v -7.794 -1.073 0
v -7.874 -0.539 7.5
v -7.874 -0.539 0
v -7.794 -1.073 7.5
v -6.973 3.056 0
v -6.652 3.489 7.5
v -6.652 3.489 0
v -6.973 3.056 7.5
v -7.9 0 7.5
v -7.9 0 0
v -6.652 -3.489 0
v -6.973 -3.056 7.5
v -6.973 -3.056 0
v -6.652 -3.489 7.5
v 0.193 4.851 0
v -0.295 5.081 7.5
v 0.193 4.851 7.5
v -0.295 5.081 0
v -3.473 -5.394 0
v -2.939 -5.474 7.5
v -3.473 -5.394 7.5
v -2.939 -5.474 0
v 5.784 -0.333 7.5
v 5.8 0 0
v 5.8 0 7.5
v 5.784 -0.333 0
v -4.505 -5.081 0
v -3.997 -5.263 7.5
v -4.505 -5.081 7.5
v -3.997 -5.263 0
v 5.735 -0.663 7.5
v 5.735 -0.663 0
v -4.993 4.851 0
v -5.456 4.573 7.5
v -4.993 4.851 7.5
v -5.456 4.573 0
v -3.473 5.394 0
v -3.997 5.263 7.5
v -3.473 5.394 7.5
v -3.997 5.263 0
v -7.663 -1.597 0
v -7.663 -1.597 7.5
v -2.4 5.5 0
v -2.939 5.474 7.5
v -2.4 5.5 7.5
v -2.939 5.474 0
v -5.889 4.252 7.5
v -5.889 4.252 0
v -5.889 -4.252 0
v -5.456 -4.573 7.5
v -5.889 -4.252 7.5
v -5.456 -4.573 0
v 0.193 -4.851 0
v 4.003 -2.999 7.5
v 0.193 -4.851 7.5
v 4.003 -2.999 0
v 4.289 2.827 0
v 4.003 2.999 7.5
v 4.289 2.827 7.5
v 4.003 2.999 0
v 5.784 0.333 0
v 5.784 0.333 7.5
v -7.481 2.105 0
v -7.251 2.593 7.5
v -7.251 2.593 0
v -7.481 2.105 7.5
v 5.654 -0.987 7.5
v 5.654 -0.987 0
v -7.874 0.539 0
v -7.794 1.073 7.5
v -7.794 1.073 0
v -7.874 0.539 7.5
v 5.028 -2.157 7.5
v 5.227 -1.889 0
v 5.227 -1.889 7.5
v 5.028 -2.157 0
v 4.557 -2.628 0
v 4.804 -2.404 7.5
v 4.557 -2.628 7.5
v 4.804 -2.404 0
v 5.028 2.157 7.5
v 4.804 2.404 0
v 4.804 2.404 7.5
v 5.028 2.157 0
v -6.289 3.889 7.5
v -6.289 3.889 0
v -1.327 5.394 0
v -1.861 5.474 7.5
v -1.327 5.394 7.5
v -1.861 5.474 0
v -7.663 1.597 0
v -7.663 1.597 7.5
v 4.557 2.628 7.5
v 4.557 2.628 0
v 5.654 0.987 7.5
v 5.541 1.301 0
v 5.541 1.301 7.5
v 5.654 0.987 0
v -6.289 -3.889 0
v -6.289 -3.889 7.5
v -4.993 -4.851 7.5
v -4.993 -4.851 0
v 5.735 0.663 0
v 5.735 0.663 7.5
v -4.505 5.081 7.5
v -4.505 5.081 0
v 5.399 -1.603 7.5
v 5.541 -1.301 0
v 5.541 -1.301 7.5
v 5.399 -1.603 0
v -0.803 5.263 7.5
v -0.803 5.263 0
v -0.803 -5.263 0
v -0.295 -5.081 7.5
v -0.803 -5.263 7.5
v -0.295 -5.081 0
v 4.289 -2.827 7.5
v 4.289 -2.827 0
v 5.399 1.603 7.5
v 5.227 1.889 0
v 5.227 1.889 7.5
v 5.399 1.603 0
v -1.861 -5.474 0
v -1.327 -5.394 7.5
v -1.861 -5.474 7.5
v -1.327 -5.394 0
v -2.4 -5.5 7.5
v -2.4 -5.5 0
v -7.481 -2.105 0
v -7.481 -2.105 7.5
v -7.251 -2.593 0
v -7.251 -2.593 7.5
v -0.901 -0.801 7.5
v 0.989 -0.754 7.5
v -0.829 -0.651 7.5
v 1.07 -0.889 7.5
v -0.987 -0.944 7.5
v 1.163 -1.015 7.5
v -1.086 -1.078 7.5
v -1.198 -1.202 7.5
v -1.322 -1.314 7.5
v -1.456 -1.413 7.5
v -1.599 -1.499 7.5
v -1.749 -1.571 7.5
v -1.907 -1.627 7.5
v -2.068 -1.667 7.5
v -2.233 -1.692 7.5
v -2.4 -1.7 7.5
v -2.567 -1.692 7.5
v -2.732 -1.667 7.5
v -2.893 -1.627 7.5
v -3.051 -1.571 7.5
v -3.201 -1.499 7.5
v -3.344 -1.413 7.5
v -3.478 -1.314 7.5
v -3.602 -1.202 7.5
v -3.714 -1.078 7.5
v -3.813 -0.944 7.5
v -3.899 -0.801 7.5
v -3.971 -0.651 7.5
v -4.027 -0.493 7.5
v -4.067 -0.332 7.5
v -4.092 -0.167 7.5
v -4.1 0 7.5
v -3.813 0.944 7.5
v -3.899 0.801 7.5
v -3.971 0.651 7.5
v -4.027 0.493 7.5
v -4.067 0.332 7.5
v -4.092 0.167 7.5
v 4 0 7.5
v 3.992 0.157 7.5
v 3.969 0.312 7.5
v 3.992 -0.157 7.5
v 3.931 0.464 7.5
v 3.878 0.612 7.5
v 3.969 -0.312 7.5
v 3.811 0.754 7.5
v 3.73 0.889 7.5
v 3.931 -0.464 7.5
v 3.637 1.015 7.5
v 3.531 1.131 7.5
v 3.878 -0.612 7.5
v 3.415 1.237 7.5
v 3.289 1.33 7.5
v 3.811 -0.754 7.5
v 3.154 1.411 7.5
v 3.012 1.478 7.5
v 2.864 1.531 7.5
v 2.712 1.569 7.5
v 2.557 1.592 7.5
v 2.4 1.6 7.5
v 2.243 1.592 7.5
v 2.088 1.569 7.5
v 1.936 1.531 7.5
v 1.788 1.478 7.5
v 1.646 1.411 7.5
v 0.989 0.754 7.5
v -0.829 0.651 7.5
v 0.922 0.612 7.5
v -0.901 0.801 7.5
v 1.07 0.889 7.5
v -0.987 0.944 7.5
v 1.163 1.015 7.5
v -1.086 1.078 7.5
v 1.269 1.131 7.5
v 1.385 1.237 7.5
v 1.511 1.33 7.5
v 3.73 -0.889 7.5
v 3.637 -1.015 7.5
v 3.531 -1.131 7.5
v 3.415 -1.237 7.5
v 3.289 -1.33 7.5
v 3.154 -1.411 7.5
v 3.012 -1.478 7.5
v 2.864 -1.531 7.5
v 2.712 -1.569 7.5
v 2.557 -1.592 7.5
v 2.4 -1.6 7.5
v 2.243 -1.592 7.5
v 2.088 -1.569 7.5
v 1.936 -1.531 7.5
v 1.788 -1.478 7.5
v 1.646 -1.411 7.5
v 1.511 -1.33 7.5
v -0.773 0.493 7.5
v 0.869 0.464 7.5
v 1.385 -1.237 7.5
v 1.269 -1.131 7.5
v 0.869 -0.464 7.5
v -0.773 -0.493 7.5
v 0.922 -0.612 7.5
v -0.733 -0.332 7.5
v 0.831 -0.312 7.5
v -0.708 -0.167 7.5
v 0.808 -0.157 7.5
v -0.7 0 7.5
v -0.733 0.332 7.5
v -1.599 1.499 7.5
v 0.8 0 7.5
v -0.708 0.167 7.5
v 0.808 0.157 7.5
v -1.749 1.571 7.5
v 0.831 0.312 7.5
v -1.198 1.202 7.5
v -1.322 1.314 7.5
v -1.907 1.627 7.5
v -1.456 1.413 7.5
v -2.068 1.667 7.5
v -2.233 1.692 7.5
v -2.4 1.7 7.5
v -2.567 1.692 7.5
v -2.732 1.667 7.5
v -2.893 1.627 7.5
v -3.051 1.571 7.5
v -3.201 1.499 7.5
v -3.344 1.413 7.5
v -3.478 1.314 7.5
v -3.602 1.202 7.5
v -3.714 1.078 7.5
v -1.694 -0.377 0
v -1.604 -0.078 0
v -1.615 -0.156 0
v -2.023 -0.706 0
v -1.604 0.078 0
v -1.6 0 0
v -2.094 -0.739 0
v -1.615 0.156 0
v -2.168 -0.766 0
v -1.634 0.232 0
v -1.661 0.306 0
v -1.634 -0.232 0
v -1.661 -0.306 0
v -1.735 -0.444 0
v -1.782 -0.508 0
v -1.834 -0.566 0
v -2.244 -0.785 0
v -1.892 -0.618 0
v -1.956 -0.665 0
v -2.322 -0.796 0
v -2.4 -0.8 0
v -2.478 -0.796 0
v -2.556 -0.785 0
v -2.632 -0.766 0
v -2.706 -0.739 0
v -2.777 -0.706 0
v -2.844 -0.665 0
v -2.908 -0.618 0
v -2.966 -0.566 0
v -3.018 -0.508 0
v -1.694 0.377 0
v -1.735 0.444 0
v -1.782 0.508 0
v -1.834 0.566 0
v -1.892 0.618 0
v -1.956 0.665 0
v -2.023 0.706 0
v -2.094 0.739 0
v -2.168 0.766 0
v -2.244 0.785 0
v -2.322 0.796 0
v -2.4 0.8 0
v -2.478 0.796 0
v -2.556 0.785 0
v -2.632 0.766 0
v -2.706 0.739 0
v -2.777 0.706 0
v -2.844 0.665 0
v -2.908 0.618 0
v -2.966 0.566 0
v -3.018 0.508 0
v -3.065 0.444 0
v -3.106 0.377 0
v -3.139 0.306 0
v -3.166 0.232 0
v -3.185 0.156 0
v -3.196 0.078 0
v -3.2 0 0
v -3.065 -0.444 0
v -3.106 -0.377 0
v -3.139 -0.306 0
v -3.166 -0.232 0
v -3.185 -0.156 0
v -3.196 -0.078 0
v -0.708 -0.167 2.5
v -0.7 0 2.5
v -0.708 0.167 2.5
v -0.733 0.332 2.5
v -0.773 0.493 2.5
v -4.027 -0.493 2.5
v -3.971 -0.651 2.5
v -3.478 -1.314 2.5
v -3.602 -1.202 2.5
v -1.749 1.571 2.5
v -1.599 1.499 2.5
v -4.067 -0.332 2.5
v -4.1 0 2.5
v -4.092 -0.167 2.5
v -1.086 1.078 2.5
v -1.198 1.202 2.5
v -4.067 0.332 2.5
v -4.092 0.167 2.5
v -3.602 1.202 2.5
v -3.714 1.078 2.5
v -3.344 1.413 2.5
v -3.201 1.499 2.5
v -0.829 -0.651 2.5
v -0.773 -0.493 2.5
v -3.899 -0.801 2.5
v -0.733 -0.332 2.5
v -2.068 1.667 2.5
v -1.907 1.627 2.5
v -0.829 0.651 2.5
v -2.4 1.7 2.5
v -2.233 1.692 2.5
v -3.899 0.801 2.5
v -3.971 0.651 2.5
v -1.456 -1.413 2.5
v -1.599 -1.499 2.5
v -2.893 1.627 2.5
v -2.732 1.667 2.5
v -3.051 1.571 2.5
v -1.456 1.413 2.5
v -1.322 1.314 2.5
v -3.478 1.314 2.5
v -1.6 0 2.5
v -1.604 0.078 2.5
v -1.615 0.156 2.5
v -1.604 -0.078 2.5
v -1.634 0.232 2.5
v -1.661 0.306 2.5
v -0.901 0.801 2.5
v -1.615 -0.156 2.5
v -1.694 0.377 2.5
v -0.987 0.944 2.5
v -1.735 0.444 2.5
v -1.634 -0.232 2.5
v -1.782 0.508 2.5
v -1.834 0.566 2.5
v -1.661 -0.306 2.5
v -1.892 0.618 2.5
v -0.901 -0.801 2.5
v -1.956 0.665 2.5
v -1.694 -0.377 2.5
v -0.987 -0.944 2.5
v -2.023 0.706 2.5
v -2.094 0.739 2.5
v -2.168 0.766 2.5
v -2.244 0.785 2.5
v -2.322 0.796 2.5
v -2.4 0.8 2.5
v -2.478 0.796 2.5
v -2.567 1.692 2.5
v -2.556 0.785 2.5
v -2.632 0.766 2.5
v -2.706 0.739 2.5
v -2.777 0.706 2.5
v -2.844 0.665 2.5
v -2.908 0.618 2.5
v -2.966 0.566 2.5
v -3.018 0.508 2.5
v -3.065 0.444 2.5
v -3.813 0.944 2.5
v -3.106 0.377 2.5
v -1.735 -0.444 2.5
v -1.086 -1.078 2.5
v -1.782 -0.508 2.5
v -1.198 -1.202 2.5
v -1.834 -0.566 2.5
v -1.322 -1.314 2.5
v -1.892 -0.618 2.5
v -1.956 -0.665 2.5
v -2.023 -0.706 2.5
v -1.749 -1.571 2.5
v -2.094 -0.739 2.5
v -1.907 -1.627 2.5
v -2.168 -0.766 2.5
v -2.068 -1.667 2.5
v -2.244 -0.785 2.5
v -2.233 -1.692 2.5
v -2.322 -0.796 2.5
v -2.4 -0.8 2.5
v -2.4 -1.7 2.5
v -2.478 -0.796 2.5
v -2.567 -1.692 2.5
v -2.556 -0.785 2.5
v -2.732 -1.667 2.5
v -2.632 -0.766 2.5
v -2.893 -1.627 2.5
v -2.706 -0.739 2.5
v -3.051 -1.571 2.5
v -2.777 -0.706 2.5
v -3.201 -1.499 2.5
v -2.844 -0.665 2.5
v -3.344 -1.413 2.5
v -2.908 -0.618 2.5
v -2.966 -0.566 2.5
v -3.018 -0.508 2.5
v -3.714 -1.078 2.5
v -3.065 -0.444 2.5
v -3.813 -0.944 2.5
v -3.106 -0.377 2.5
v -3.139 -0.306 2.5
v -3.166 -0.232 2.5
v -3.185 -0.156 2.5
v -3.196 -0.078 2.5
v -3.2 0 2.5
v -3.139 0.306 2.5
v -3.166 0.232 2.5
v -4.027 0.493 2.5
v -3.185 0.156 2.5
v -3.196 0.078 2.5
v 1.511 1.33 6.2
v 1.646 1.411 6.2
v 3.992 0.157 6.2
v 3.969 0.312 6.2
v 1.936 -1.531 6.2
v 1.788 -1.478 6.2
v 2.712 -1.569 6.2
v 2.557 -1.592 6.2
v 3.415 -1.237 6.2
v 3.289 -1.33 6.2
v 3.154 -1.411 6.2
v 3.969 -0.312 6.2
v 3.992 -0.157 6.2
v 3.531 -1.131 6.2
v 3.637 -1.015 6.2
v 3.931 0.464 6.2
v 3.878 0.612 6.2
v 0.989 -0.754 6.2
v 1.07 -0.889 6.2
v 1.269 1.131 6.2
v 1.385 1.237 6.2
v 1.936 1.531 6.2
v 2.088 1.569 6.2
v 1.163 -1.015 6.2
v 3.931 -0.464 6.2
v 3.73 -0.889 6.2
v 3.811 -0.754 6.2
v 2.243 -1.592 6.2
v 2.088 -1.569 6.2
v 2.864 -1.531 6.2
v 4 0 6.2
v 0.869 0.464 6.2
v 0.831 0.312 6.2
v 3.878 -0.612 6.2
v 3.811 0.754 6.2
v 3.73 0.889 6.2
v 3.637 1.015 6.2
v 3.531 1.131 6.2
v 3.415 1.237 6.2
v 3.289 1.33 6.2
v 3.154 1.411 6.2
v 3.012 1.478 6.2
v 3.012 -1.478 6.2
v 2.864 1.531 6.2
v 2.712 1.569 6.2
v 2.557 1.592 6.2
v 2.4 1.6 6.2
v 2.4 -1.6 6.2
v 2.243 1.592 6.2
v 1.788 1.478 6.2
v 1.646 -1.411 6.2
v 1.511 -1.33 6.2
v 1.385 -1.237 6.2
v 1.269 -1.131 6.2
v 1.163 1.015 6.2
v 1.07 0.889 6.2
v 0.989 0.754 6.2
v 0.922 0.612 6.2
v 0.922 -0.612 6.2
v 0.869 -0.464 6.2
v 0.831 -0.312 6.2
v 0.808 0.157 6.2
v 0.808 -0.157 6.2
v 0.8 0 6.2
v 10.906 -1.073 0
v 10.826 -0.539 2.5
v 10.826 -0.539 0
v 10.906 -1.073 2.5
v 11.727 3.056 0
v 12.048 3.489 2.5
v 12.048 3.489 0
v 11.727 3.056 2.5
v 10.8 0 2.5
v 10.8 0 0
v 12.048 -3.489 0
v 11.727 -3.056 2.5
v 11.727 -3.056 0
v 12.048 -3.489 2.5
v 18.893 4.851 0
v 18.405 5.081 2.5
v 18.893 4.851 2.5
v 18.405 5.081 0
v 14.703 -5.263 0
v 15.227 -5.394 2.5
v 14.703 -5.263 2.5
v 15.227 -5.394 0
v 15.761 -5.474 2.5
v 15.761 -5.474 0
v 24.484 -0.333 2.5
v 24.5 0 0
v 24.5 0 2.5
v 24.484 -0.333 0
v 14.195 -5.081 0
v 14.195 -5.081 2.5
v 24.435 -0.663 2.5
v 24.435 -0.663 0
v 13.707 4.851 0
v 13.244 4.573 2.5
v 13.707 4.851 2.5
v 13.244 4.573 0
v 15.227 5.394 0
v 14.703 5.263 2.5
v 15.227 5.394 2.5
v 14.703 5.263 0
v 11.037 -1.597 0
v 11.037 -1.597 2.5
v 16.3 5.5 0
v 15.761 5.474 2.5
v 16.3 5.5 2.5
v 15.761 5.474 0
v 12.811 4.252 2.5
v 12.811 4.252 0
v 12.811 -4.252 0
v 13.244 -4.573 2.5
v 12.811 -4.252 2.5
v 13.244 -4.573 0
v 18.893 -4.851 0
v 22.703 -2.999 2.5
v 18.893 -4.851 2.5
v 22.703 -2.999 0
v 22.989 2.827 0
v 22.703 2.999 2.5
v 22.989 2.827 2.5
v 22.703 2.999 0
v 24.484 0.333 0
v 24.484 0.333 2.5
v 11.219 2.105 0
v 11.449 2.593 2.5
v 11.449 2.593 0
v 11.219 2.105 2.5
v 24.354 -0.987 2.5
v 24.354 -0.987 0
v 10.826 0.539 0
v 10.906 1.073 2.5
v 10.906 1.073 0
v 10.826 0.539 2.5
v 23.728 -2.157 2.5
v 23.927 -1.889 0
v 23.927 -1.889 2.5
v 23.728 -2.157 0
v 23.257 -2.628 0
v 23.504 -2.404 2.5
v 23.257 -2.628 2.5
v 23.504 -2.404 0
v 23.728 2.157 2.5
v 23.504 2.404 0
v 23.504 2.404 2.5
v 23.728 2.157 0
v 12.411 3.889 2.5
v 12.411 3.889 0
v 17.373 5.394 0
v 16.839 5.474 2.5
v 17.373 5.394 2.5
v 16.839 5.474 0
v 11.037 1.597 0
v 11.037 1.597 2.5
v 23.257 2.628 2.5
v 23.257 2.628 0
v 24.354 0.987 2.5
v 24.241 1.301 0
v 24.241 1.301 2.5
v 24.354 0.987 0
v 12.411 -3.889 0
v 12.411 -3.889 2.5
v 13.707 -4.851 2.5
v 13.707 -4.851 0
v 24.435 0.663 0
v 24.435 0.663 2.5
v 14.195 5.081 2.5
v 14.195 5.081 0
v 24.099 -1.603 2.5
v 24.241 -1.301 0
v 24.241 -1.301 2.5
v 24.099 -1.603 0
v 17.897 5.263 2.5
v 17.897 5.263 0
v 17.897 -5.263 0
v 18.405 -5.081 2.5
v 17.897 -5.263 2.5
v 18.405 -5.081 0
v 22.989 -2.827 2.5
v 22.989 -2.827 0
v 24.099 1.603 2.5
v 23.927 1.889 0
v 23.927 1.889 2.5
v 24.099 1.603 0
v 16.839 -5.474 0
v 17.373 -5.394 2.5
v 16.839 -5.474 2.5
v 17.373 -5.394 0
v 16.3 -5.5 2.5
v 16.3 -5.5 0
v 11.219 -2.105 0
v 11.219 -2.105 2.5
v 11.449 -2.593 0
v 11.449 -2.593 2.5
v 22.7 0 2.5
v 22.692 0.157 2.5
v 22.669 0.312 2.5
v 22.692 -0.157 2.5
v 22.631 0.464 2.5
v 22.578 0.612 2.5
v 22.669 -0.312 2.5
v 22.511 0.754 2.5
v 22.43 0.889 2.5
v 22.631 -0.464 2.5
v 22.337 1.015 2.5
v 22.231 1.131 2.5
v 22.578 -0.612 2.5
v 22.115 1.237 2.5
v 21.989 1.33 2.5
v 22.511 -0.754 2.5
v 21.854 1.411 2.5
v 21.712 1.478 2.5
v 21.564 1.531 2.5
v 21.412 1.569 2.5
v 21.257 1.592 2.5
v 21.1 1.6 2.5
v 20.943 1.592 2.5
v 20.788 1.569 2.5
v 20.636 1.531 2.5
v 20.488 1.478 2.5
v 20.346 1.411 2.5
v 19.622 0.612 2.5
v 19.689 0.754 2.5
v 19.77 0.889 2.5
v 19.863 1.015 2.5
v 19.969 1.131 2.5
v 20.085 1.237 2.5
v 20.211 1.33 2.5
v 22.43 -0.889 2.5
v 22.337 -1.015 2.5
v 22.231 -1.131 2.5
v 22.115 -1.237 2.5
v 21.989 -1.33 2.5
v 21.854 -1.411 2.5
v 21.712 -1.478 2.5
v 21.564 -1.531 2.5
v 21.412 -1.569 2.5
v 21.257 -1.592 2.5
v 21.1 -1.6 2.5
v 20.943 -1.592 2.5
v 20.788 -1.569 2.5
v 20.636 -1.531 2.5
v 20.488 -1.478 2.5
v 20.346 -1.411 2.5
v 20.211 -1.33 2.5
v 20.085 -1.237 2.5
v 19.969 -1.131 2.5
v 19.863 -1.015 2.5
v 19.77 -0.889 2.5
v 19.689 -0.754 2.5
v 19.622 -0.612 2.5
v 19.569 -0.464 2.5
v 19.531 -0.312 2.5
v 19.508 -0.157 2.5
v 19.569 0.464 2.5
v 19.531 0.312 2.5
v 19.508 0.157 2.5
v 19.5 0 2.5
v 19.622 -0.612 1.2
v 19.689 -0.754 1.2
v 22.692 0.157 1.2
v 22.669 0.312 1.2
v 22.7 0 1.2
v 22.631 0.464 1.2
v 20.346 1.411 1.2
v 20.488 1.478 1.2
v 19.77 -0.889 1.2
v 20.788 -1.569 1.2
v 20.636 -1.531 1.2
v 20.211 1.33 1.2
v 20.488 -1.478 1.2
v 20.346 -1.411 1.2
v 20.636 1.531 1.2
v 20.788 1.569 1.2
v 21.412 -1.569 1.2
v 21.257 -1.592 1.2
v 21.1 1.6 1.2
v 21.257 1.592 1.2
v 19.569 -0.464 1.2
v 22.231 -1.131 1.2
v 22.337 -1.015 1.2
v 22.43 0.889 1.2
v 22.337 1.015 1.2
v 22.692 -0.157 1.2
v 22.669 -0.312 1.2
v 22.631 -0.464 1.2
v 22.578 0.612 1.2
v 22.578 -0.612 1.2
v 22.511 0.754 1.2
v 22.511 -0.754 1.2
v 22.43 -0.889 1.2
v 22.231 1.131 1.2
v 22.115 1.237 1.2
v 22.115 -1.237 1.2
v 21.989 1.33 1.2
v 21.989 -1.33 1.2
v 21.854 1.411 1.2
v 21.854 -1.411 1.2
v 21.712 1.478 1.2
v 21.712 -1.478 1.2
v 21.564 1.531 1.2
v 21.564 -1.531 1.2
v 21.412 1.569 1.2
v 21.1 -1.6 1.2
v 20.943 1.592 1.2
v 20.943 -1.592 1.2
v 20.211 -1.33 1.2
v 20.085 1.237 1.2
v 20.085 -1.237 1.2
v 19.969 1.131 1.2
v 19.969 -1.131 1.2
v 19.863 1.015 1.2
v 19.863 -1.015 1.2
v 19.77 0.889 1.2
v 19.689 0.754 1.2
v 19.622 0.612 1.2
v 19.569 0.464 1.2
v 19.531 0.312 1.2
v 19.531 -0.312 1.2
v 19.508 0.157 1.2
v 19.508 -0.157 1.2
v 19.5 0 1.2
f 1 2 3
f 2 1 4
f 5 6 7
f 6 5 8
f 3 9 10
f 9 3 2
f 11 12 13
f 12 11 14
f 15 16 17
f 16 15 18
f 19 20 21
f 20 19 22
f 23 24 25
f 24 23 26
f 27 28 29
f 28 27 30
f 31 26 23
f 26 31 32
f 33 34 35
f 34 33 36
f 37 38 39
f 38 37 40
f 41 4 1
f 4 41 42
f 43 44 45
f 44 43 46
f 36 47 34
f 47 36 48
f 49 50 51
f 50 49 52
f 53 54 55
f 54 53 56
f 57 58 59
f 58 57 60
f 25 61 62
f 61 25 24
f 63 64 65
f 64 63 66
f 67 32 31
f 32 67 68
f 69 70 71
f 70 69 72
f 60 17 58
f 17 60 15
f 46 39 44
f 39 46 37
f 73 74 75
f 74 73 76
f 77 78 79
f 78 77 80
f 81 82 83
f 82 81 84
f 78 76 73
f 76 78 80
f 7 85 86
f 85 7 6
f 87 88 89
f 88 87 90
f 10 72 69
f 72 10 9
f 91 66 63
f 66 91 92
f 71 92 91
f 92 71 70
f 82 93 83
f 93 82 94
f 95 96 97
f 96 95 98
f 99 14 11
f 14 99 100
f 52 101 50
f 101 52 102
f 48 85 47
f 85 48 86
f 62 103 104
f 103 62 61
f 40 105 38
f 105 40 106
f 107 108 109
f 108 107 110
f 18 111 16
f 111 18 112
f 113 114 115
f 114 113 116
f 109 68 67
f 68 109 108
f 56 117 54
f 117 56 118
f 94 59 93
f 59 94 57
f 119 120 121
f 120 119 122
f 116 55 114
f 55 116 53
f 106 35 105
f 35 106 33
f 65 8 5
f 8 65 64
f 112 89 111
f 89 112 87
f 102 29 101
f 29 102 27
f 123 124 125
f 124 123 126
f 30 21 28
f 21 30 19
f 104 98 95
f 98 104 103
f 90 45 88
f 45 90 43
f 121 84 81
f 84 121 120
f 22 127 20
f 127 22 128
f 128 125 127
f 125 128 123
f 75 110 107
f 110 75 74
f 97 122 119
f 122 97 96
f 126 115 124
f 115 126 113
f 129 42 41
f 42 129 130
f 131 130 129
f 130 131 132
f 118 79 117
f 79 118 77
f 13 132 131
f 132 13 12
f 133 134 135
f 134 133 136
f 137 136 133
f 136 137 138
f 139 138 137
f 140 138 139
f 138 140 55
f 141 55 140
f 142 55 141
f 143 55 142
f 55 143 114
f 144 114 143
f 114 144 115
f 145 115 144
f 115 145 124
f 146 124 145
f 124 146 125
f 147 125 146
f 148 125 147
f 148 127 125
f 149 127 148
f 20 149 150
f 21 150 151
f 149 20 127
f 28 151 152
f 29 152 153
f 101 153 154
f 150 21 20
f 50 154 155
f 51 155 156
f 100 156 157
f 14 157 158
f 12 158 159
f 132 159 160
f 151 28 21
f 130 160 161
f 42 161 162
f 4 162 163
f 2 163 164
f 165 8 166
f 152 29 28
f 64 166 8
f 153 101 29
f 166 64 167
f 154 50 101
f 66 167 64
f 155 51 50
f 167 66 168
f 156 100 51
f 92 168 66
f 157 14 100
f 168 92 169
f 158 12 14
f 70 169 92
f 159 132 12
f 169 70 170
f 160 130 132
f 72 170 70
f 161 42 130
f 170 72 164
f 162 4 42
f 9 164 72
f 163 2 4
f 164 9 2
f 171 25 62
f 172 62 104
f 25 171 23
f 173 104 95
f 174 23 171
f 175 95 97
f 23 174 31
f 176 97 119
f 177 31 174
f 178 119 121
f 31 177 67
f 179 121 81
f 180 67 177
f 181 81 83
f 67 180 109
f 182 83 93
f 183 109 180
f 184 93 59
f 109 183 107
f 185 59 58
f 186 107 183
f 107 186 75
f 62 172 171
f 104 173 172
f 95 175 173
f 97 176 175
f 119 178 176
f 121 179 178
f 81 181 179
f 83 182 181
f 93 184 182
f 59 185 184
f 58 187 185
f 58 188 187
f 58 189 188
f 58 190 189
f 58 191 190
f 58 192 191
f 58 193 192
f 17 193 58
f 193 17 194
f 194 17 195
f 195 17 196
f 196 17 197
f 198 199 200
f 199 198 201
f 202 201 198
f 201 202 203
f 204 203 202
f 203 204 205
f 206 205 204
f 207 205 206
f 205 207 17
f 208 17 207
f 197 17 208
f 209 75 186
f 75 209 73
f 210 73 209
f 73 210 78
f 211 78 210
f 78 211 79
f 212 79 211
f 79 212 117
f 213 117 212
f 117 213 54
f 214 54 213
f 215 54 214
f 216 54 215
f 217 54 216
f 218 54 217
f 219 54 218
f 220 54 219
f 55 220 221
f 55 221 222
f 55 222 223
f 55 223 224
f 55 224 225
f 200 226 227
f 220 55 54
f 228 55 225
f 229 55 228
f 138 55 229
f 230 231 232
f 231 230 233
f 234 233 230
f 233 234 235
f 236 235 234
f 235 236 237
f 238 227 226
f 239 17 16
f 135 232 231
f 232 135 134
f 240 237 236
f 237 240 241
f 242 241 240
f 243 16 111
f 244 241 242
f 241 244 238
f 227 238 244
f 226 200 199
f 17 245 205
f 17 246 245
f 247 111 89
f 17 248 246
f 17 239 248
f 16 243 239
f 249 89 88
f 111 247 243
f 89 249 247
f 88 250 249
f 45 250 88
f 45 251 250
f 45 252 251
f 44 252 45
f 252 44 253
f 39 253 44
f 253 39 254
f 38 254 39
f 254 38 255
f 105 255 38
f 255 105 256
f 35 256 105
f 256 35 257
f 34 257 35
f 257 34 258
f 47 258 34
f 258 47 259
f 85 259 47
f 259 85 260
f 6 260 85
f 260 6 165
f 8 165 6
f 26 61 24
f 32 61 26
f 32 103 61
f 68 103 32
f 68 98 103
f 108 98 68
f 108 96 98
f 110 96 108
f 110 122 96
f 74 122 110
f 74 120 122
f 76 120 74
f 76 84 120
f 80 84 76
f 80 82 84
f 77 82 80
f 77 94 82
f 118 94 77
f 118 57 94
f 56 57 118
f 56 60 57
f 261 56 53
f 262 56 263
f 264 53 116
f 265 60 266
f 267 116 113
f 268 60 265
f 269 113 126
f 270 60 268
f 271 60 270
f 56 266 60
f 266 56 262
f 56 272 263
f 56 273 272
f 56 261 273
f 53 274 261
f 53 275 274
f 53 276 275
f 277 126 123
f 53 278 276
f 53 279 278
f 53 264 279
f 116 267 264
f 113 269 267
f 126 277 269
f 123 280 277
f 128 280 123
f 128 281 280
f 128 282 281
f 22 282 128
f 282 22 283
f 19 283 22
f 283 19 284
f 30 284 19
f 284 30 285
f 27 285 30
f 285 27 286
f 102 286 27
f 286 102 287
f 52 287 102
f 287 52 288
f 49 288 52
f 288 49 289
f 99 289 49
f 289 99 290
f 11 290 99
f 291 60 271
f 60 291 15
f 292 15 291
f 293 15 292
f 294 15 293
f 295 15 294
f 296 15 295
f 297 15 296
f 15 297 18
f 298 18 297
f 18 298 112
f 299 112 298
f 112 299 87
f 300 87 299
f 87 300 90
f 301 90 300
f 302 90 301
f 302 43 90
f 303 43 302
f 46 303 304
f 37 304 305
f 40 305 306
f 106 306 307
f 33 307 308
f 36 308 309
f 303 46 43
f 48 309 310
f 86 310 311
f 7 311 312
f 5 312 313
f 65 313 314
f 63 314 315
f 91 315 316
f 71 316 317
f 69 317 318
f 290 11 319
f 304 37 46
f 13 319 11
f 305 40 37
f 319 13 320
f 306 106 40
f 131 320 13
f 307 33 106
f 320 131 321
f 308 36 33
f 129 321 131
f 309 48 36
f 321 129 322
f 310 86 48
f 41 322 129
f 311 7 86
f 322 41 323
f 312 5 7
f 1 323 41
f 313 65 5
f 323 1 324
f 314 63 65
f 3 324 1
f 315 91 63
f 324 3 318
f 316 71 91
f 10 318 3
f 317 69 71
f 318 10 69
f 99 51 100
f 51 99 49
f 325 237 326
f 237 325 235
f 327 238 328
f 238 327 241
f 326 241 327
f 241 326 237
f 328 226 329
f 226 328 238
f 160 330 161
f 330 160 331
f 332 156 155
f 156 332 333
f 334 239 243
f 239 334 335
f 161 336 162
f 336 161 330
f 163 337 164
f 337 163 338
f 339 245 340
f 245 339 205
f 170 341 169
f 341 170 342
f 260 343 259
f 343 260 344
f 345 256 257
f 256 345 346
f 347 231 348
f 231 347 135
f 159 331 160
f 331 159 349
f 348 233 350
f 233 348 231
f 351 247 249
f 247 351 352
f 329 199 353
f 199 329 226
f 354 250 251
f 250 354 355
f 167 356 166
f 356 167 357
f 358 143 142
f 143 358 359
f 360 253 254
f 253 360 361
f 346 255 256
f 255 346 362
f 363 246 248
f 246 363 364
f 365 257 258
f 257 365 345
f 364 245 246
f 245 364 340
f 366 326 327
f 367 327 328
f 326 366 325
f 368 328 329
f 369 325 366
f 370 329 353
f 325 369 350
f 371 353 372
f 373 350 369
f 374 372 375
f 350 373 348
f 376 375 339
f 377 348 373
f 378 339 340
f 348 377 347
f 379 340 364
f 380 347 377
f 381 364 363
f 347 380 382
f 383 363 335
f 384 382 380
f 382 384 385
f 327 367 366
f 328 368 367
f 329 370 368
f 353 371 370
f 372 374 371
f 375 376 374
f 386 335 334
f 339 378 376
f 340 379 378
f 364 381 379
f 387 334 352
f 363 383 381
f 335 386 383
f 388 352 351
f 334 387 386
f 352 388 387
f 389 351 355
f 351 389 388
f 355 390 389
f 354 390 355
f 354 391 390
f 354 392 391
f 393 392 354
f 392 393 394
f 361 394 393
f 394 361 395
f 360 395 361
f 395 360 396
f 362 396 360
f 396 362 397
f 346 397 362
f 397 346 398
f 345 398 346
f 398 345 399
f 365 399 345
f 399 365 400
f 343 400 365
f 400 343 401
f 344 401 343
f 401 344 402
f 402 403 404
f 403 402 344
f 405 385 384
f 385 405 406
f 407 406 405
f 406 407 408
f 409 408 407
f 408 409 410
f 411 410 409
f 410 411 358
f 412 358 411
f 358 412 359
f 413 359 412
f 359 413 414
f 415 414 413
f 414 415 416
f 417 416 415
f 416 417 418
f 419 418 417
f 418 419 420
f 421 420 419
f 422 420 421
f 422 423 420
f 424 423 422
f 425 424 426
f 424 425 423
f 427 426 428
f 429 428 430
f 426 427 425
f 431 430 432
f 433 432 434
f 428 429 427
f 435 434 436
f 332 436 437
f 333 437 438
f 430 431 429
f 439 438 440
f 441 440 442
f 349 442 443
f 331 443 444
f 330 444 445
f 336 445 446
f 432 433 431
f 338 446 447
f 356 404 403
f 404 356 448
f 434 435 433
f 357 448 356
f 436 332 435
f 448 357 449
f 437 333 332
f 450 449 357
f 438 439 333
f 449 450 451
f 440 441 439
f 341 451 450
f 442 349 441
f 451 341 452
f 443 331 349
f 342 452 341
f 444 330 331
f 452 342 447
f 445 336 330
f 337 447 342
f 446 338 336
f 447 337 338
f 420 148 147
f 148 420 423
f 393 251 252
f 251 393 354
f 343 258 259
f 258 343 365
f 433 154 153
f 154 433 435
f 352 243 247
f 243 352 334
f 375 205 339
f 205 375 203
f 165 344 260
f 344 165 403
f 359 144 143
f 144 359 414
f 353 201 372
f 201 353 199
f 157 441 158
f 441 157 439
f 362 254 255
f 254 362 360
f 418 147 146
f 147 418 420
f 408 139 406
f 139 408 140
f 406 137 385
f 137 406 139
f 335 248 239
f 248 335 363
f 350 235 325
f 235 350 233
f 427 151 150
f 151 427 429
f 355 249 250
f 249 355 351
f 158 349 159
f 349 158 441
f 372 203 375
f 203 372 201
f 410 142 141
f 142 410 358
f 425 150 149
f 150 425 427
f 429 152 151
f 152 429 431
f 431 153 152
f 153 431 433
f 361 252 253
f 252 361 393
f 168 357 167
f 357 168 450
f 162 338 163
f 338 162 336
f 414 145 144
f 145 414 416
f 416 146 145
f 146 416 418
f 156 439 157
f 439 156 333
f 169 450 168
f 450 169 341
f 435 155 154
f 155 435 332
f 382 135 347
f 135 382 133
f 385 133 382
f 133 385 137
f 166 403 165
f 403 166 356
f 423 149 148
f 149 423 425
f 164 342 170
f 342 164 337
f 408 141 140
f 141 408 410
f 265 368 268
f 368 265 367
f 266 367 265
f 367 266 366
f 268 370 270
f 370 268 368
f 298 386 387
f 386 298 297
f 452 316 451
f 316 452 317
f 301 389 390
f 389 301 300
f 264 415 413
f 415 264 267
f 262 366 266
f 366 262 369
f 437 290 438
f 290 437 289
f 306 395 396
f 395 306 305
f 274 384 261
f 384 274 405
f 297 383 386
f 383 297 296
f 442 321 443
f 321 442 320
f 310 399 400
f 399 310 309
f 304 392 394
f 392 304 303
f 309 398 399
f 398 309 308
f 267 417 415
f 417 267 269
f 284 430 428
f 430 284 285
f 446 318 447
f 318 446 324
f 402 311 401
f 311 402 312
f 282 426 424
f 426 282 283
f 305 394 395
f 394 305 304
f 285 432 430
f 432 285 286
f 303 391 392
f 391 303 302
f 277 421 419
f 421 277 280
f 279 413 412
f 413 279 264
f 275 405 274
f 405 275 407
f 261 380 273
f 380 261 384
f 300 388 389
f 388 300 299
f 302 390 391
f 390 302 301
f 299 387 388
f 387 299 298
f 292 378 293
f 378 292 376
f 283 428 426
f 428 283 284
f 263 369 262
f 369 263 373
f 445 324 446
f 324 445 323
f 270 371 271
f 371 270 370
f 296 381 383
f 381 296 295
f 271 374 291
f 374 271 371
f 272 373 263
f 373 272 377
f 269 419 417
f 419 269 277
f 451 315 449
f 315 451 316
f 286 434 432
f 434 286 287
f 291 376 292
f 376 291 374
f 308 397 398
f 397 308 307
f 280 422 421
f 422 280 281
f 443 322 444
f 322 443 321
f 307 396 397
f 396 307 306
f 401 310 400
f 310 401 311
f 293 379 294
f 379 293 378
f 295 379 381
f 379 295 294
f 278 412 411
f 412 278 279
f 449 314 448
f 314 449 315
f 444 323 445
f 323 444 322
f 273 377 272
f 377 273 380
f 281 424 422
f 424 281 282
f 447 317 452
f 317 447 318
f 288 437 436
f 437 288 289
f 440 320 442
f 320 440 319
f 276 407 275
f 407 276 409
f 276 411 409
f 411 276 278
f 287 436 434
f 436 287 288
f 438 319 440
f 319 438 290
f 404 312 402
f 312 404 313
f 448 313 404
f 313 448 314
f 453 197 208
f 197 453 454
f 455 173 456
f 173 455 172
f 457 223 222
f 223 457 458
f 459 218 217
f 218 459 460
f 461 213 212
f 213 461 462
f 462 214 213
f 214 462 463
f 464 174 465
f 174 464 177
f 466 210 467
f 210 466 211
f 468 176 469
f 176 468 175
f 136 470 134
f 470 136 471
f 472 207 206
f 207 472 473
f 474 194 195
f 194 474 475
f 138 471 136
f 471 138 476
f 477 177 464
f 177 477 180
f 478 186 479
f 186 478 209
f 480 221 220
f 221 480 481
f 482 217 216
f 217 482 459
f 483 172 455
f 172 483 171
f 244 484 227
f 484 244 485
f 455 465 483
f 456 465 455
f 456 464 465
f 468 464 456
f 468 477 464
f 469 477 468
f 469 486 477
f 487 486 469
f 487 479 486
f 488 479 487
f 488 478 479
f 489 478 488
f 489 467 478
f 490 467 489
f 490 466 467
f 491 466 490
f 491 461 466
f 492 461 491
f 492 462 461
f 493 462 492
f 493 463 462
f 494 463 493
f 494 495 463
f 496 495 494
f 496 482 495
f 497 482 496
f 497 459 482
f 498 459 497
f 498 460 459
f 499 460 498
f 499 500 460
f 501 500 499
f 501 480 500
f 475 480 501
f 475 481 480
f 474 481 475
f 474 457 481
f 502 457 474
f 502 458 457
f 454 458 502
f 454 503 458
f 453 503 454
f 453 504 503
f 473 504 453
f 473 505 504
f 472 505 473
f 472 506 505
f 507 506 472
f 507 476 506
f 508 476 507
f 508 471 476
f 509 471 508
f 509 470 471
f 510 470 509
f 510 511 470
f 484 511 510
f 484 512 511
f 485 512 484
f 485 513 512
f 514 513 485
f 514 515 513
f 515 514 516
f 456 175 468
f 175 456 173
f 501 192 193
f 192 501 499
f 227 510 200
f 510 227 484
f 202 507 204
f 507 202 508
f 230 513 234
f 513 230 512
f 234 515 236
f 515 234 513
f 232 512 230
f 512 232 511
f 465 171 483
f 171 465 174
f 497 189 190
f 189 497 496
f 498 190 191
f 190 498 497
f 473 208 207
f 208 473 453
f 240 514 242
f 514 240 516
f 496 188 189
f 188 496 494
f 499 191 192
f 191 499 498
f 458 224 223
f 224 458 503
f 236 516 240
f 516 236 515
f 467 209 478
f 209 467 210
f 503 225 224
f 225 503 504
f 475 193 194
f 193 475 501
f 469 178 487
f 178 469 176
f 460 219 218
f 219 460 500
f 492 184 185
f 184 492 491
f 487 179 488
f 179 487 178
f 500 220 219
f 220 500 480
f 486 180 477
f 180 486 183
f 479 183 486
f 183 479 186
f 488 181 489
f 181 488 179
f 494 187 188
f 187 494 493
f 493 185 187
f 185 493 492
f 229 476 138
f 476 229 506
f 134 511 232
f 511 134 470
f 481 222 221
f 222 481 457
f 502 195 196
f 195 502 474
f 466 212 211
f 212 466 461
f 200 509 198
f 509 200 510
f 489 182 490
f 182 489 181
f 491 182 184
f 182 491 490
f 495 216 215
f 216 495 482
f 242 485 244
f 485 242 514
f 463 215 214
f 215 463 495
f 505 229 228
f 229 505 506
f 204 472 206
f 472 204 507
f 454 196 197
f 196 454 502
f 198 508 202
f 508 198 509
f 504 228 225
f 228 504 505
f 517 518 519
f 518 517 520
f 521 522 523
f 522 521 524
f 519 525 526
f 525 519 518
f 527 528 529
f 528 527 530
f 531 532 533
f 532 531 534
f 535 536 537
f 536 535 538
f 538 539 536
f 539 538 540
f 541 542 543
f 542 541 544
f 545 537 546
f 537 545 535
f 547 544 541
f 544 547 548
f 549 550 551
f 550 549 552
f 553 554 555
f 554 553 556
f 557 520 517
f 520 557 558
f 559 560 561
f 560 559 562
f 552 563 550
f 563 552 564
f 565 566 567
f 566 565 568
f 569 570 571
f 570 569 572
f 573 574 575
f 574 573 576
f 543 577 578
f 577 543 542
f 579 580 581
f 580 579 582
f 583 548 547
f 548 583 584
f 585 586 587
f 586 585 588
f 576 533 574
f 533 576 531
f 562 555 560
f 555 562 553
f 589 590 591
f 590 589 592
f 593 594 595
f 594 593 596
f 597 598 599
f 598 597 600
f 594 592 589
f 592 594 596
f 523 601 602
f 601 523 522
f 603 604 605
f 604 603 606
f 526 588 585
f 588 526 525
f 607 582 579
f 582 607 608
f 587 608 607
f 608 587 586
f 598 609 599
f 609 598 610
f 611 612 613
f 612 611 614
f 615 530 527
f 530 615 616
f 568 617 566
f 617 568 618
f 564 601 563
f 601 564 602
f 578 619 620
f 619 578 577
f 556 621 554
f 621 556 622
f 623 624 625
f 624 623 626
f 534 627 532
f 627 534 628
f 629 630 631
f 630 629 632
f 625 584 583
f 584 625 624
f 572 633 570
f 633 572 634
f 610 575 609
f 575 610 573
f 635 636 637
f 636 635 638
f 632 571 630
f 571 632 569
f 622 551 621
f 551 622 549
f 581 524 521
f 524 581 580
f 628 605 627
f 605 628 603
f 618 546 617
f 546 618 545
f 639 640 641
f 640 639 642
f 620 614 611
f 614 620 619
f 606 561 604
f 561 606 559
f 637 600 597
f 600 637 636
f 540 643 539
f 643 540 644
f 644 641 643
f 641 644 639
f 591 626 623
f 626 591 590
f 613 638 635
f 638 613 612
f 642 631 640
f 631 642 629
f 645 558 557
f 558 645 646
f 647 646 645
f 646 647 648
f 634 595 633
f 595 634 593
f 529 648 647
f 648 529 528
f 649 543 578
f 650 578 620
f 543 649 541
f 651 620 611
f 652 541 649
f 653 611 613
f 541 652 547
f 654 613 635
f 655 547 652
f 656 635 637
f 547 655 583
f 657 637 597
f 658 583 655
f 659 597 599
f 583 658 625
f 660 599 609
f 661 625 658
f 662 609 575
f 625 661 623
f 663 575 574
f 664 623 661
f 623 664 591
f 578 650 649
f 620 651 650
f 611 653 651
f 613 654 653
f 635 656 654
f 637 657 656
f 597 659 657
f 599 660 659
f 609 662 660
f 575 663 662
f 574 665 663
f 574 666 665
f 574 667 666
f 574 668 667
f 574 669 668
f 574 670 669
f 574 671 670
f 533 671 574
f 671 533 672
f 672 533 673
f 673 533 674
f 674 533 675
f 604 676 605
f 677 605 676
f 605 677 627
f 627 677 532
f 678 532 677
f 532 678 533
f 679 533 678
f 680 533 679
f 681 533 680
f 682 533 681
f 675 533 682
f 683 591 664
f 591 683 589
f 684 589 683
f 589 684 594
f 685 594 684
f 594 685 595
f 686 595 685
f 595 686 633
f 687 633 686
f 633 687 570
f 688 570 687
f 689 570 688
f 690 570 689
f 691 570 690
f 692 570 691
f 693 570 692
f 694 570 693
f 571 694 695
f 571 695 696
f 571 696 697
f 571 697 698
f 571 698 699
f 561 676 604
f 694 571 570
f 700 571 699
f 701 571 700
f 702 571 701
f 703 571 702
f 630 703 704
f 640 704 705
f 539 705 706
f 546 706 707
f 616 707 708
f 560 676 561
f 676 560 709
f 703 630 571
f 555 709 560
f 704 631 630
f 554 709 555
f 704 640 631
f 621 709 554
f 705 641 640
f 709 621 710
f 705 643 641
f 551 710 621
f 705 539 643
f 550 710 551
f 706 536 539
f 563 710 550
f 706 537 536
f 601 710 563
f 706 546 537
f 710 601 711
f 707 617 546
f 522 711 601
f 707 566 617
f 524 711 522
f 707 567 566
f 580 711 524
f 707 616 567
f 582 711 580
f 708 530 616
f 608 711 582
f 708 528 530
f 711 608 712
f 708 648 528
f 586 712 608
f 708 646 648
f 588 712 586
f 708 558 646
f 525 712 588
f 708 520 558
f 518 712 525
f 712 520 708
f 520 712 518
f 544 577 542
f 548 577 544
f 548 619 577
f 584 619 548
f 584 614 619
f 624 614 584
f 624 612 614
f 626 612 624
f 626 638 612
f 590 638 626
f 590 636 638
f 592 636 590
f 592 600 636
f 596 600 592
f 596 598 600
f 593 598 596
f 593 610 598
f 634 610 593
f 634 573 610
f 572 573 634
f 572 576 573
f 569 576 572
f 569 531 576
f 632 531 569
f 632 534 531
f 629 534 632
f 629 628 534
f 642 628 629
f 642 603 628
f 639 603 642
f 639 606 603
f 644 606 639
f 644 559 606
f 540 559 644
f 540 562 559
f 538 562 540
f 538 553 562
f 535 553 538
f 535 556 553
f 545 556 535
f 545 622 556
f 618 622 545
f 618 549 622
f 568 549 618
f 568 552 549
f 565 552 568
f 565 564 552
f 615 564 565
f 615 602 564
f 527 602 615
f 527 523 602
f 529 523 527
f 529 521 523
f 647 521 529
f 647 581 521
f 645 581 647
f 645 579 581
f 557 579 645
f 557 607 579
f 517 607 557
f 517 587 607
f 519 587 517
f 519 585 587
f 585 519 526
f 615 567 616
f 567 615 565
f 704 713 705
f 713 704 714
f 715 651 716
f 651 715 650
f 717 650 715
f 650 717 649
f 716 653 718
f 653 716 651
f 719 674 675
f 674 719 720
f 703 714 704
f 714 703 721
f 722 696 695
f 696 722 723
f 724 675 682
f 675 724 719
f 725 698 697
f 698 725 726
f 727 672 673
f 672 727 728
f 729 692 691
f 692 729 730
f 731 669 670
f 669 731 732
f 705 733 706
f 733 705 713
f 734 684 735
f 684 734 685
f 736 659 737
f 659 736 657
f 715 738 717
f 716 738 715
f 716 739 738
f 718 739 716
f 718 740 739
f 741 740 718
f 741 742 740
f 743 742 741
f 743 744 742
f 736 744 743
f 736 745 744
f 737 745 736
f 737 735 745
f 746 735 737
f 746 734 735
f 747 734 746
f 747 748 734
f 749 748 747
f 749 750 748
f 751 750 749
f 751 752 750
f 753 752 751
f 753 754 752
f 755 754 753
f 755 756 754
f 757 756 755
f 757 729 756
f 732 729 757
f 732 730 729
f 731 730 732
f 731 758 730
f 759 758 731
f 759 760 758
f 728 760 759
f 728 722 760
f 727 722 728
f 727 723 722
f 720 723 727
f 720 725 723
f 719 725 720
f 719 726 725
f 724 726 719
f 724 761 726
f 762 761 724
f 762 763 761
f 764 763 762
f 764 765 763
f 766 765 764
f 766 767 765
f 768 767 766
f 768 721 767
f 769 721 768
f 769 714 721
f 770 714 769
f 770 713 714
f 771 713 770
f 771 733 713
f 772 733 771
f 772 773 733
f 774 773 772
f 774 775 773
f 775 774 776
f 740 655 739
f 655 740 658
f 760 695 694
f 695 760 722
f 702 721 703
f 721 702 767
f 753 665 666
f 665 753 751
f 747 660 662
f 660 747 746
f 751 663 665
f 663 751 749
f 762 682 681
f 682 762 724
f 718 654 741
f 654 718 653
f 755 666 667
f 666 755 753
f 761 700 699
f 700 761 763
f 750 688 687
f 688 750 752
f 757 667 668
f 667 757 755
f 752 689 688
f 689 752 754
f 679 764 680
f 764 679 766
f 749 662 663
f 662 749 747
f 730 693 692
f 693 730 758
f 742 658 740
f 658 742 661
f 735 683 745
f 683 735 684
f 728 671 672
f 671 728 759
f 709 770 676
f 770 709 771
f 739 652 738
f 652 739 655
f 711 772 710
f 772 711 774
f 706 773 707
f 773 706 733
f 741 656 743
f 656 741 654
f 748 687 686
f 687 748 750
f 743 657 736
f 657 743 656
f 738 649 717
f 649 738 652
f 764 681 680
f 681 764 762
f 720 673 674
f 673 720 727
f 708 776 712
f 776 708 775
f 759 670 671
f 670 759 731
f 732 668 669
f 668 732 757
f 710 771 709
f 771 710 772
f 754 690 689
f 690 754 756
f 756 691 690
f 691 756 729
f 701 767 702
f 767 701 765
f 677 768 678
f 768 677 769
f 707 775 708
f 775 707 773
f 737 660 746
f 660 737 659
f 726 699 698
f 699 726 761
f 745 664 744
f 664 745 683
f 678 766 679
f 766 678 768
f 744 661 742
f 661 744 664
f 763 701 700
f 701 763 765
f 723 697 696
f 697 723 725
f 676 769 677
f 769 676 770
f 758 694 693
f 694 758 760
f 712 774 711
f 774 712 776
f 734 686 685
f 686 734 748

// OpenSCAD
// ============================================================
// Camera-in-use LED sensor pod + magnetic anchor
// For: Logitech Brio 105, TEPT4400 phototransistor, 3x1mm magnets
//
// Two parts on one plate:
//   1) sensor_pod()     - holds the TEPT4400 + acts as the light shroud
//   2) magnet_anchor()  - sticks to the camera next to the LED
//
// MEASURED FROM THE ACTUAL CAMERA (tape measure + photos):
//   - LED is a thin arc, ~10-11mm from the camera's left edge (~1mm wide)
//   - Top of the LED arc is ~12mm from the camera's top edge
//   - Camera housing (front capsule) thickness/depth: 17mm
// These numbers are for placing the anchor by hand - they are NOT baked
// into the model, since the pod attaches via magnet, not a fixed clamp.
// Before printing: cut a ~14mm x 11mm rectangle out of paper/cardboard
// and hold it at that spot on the real camera to confirm it clears the
// lens and the housing's curved edge - cheap sanity check against a
// camera curvature I'm guessing at, not measuring directly.
//
// ROTATION KEYING
// A single round magnet-to-magnet joint has no rotational preference -
// the pod could spin on re-attachment and drift the tunnel off the LED.
// To prevent that, the pod/anchor footprint is deliberately asymmetric
// (a "fat end" toward the sensor bore, "thin end" toward the magnet) so
// the two parts can only mate in the correct orientation.
//
// PRINT NOTES
// - Material: matte black PETG or ABS. Glossy filament reflects stray
//   light down the tunnel and defeats the shroud.
// - Orientation: print both parts sitting on their front/adhesive face,
//   holes opening upward - no supports needed either part.
// - FDM holes print undersized - test-fit the TEPT4400 and the magnet
//   after printing; ream out by hand with a 3mm/3.2mm drill bit if tight.
// - The front rim is flat/rigid and won't perfectly match the camera's
//   slight curve. Stick a thin ring of adhesive foam weatherstrip tape
//   to the front rim before final placement - it conforms to the curve
//   and completes the light seal far better than bare plastic-on-plastic.
// - Mark the magnet's polarity with a marker dot before gluing into each
//   part, so pod and anchor always attract (not repel).
// ============================================================

$fn = 64; // smooth circles

// ---- measure-and-adjust before printing ----
tept_dome_d      = 3.0;   // TEPT4400 dome diameter (datasheet nominal)
tept_bore_d      = tept_dome_d + 0.4;   // add clearance
tept_bore_depth  = 5.0;   // dome + a bit of the leaded body

tunnel_d         = 1.6;   // narrowed from an earlier 2.0mm - the measured
                          // LED arc is only ~1mm wide, so a tighter
                          // tunnel improves contrast (trade-off: needs
                          // more careful alignment when placing the pod)
tunnel_len       = 2.5;   // longer = better ambient-light rejection,
                          // but must stay clear of the lens - keep short

magnet_d         = 3.2;   // 3mm magnet + clearance
magnet_len       = 1.3;   // 1mm magnet + a little glue gap

pod_wall         = 1.8;   // wall thickness around each hole
hole_gap         = 1.5;   // minimum plastic wall between the two holes
key_bump         = 2.0;   // extra radius on the sensor end only - this is
                          // what makes the footprint asymmetric

pod_len          = tept_bore_depth + tunnel_len;

// hole centers, offset along X so the two blind holes never intersect
hole_offset = tept_bore_d/2 + magnet_d/2 + hole_gap;
sensor_x = -hole_offset/2;
magnet_x =  hole_offset/2;

r_sensor_end = tept_bore_d/2 + pod_wall + key_bump; // "fat end"
r_magnet_end = magnet_d/2 + pod_wall;               // "thin end"

// ============================================================
module pod_footprint(r1, r2) {
    hull() {
        translate([sensor_x, 0]) circle(r = r1);
        translate([magnet_x, 0]) circle(r = r2);
    }
}

module sensor_pod() {
    difference() {
        linear_extrude(height = pod_len)
            pod_footprint(r_sensor_end, r_magnet_end);

        // sensor bore: wide dome pocket, opens at the BACK face (top)
        translate([sensor_x, 0, tunnel_len])
            cylinder(d = tept_bore_d, h = tept_bore_depth + 1);

        // narrow shroud tunnel, opens at the FRONT face (presses on camera)
        translate([sensor_x, 0, 0])
            cylinder(d = tunnel_d, h = tunnel_len + 0.5);

        // magnet pocket, opens at the BACK face, same side as the bore
        translate([magnet_x, 0, pod_len - magnet_len])
            cylinder(d = magnet_d, h = magnet_len + 0.5);
    }
}

module magnet_anchor() {
    anchor_thick = magnet_len + 1.2;
    difference() {
        linear_extrude(height = anchor_thick)
            pod_footprint(r_sensor_end, r_magnet_end);

        // magnet pocket at the same X position as the pod's magnet hole,
        // so the two parts only line up magnet-to-magnet when the fat
        // end (sensor side) of both point the same way
        translate([magnet_x, 0, anchor_thick - magnet_len])
            cylinder(d = magnet_d, h = magnet_len + 0.5);
    }
}

// ---- layout for printing ----
pod_total_len = hole_offset/2 + r_sensor_end + hole_offset/2 + r_magnet_end;

sensor_pod();
translate([pod_total_len + 5, 0, 0])
    magnet_anchor();
